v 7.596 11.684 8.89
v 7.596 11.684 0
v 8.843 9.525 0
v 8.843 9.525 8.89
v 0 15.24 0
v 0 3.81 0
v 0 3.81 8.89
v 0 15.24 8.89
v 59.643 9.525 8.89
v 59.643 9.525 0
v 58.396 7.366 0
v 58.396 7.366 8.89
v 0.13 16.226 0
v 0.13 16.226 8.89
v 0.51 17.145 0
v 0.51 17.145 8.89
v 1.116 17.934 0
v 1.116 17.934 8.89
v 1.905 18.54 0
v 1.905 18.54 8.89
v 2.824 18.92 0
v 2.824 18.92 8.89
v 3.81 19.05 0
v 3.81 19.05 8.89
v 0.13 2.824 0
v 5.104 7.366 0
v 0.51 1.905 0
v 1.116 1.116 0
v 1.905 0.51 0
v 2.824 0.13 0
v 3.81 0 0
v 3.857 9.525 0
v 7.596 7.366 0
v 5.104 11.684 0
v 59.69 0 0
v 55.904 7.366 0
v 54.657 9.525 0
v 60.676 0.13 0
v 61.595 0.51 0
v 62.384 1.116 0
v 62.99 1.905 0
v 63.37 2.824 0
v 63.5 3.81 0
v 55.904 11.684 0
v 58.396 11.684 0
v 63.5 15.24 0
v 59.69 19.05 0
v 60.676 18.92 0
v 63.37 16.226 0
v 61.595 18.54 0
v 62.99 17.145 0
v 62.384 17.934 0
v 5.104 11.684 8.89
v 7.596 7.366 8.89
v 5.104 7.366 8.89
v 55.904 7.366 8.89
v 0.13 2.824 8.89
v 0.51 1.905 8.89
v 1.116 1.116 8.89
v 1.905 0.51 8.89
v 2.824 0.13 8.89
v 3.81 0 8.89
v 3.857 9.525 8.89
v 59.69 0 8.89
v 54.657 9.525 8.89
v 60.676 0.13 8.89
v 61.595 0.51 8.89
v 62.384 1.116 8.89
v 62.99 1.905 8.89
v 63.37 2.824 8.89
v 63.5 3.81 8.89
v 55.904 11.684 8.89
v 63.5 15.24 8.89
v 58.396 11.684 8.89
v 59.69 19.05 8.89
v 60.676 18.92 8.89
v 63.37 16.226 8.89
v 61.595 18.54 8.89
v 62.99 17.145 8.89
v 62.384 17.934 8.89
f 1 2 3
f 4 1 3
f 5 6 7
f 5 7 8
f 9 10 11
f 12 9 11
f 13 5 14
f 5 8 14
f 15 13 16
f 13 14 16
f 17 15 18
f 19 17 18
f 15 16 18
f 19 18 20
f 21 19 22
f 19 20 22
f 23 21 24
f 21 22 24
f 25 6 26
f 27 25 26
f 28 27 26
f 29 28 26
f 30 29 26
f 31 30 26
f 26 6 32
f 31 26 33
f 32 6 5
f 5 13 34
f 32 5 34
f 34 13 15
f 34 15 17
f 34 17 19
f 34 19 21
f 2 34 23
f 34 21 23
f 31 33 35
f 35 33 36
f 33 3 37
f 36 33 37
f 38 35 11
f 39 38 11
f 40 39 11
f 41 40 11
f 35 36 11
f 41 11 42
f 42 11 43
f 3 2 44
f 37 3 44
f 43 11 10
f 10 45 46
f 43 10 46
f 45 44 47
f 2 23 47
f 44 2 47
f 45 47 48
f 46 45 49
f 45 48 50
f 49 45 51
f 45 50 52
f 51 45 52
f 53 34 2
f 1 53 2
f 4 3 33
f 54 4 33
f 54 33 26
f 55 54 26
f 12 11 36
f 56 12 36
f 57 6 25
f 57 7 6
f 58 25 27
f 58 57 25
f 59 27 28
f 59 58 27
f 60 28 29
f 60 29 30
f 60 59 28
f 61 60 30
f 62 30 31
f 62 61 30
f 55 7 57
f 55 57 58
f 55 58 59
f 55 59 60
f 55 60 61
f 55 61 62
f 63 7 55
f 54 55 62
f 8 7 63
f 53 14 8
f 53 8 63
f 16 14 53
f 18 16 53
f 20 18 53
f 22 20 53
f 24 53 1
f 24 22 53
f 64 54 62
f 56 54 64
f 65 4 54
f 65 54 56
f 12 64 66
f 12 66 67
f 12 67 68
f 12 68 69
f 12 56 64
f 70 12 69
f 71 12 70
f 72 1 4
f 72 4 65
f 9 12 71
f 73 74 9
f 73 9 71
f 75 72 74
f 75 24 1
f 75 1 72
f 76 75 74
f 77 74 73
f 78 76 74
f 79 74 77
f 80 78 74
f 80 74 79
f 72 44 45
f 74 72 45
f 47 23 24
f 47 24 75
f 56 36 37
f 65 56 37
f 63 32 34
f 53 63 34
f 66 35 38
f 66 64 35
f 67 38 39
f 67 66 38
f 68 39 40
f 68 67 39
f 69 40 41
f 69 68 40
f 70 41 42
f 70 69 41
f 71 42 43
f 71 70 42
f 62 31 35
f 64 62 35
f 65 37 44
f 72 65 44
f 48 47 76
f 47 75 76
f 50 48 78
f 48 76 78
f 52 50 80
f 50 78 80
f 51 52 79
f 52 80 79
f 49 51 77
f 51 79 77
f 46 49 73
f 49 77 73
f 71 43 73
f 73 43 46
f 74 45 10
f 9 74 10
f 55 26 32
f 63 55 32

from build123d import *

# Parameters (mm, degrees)
F0_W     = 63.5
F0_H     = 19.05
F1_DEPTH = 8.89
F2_R     = 3.81


with BuildPart() as f1:
    # F0 (on Top) → F1 (new body)
    with BuildSketch(Plane.XY):
        with Locations((31.75, 9.525)):
            Rectangle(F0_W, F0_H)
        Polygon((3.857002, 9.525), (5.103501, 11.684), (7.596499, 11.684), (8.842998, 9.525), (7.596499, 7.366), (5.103501, 7.366), align=None, mode=Mode.SUBTRACT)
        Polygon((54.657002, 9.525), (55.903501, 11.684), (58.396499, 11.684), (59.642998, 9.525), (58.396499, 7.366), (55.903501, 7.366), align=None, mode=Mode.SUBTRACT)
    extrude(amount=F1_DEPTH)

    # F2
    f2_edges = [f1.edges().sort_by_distance(p)[0] for p in [
        (0, 0, 4.445),
        (0, 19.05, 4.445),
        (63.5, 0, 4.445),
        (63.5, 19.05, 4.445),
    ]]
    fillet(f2_edges, radius=F2_R)


solid = f1.part
